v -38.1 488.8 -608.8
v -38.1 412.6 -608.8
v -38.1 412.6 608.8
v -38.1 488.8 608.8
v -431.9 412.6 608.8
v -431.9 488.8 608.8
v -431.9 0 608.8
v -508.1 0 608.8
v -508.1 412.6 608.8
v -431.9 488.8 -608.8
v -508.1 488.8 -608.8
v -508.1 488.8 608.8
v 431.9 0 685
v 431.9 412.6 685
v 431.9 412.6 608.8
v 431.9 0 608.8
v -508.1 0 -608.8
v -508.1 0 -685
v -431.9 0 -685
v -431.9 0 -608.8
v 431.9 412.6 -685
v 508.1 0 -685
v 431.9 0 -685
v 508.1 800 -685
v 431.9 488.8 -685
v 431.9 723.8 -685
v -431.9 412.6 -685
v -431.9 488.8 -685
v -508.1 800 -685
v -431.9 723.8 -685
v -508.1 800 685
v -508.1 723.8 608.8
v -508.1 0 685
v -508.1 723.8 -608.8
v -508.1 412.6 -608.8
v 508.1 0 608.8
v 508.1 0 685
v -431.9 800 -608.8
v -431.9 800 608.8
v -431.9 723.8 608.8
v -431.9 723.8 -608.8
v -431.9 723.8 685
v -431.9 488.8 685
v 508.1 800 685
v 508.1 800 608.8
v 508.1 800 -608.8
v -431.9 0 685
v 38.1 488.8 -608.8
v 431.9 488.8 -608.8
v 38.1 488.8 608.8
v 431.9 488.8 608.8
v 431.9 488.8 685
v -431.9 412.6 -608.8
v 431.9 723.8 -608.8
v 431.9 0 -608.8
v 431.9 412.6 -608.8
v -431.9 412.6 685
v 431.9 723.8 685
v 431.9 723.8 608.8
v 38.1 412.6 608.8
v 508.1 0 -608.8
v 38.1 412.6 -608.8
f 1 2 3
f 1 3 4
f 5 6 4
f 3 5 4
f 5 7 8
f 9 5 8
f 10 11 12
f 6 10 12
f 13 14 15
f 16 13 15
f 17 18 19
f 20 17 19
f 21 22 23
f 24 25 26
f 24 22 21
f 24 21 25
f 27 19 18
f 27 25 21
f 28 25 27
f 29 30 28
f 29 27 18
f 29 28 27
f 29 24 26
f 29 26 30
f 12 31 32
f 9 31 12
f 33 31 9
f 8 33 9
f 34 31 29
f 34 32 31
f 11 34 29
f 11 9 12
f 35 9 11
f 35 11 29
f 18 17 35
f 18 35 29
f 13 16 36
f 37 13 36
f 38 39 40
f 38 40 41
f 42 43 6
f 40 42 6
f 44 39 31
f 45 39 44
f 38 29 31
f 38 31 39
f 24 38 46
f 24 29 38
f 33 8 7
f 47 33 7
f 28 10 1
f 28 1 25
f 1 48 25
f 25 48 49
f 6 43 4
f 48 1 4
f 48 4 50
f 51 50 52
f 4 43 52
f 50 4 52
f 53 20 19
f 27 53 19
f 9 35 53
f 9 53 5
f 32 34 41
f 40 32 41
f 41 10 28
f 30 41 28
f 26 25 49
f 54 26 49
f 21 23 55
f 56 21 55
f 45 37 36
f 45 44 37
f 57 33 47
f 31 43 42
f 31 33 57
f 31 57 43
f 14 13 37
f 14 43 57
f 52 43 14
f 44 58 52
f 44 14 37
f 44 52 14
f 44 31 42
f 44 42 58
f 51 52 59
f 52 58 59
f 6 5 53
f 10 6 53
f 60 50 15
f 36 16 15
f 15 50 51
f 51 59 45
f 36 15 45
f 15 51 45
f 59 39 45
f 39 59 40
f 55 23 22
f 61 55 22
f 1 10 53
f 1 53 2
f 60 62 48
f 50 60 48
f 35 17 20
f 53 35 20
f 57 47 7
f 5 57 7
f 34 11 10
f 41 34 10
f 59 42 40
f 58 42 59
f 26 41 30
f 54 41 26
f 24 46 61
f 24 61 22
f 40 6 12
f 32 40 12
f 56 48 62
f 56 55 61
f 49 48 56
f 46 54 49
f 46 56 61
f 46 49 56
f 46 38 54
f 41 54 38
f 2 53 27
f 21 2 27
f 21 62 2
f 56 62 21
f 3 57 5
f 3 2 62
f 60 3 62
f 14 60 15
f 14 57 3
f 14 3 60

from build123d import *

# Parameters (mm, degrees)
CROQUIS1_W              = 1016.2
CROQUIS1_H              = 1370
SALIENTE_EXTRUIR1_DEPTH = 800
CORTAR_EXTRUIR1_DEPTH   = 723.8
CROQUIS3_W              = 863.8
CROQUIS3_H              = 1217.6
CORTAR_EXTRUIR2_DEPTH   = 76.2
CROQUIS5_W              = 1217.6
CROQUIS5_H              = 76.2
SALIENTE_EXTRUIR2_DEPTH = 76.2
CROQUIS6_W              = 863.8
CROQUIS6_H              = 76.2
SALIENTE_EXTRUIR3_DEPTH = 76.2
CROQUIS7_W              = 1217.6
CROQUIS7_H              = 76.2
SALIENTE_EXTRUIR4_DEPTH = 76.2
CROQUIS8_W              = 863.8
CROQUIS8_H              = 76.2
SALIENTE_EXTRUIR5_DEPTH = 76.2
CROQUIS9_W              = 76.2
CROQUIS9_H              = 1217.6
CORTAR_EXTRUIR4_DEPTH   = 387.4
CROQUIS10_W             = 76.2
CROQUIS10_H             = 76.2
SALIENTE_EXTRUIR6_DEPTH = 1217.6


with BuildPart() as part:
    # Croquis1 → Saliente-Extruir1 (new body)
    with BuildSketch(Plane(origin=(0, 0, 0), x_dir=(1, 0, 0), z_dir=(0, 1, 0))):
        Rectangle(CROQUIS1_W, CROQUIS1_H)
    extrude(amount=SALIENTE_EXTRUIR1_DEPTH)

    # Croquis2 → Cortar-Extruir1 (cut)
    with BuildSketch(Plane.XZ):
        Polygon((431.9, 608.8), (431.9, 685), (-431.9, 685), (-431.9, 608.8), (-508.1, 608.8), (-508.1, -608.8), (-431.9, -608.8), (-431.9, -685), (431.9, -685), (431.9, -608.8), (508.1, -608.8), (508.1, 608.8), align=None)
    extrude(amount=-CORTAR_EXTRUIR1_DEPTH, mode=Mode.SUBTRACT)

    # Croquis3 → Cortar-Extruir2 (cut)
    with BuildSketch(Plane(origin=(0, 800, 0), x_dir=(1, 0, 0), z_dir=(0, 1, 0))):
        Rectangle(CROQUIS3_W, CROQUIS3_H)
    extrude(amount=-CORTAR_EXTRUIR2_DEPTH, mode=Mode.SUBTRACT)

    # Croquis5 → Saliente-Extruir2 (add)
    with BuildSketch(Plane.ZY.offset(508.1)):
        with Locations((0, 450.7)):
            Rectangle(CROQUIS5_W, CROQUIS5_H)
    extrude(amount=-SALIENTE_EXTRUIR2_DEPTH)

    # Croquis6 → Saliente-Extruir3 (add)
    with BuildSketch(Plane(origin=(0, 0, -685), x_dir=(-1, 0, 0), z_dir=(0, 0, -1))):
        with Locations((0, 450.7)):
            Rectangle(CROQUIS6_W, CROQUIS6_H)
    extrude(amount=-SALIENTE_EXTRUIR3_DEPTH)

    # Croquis7 → Saliente-Extruir4 (add)
    with BuildSketch(Plane(origin=(508.1, 0, 0), x_dir=(0, 0, -1), z_dir=(1, 0, 0))):
        with Locations((0, 450.7)):
            Rectangle(CROQUIS7_W, CROQUIS7_H)
    extrude(amount=-SALIENTE_EXTRUIR4_DEPTH)

    # Croquis8 → Saliente-Extruir5 (add)
    with BuildSketch(Plane.XY.offset(685)):
        with Locations((0, 450.7)):
            Rectangle(CROQUIS8_W, CROQUIS8_H)
    extrude(amount=-SALIENTE_EXTRUIR5_DEPTH)

    # Croquis9 → Cortar-Extruir4 (cut)
    with BuildSketch(Plane(origin=(0, 800, 0), x_dir=(1, 0, 0), z_dir=(0, 1, 0))):
        with Locations((470, 0)):
            Rectangle(CROQUIS9_W, CROQUIS9_H)
    extrude(amount=-CORTAR_EXTRUIR4_DEPTH, mode=Mode.SUBTRACT)

    # Croquis10 → Saliente-Extruir6 (add)
    with BuildSketch(Plane.XY.offset(-608.8)):
        with Locations((0, 450.7)):
            Rectangle(CROQUIS10_W, CROQUIS10_H)
    extrude(amount=SALIENTE_EXTRUIR6_DEPTH)


solid = part.part
